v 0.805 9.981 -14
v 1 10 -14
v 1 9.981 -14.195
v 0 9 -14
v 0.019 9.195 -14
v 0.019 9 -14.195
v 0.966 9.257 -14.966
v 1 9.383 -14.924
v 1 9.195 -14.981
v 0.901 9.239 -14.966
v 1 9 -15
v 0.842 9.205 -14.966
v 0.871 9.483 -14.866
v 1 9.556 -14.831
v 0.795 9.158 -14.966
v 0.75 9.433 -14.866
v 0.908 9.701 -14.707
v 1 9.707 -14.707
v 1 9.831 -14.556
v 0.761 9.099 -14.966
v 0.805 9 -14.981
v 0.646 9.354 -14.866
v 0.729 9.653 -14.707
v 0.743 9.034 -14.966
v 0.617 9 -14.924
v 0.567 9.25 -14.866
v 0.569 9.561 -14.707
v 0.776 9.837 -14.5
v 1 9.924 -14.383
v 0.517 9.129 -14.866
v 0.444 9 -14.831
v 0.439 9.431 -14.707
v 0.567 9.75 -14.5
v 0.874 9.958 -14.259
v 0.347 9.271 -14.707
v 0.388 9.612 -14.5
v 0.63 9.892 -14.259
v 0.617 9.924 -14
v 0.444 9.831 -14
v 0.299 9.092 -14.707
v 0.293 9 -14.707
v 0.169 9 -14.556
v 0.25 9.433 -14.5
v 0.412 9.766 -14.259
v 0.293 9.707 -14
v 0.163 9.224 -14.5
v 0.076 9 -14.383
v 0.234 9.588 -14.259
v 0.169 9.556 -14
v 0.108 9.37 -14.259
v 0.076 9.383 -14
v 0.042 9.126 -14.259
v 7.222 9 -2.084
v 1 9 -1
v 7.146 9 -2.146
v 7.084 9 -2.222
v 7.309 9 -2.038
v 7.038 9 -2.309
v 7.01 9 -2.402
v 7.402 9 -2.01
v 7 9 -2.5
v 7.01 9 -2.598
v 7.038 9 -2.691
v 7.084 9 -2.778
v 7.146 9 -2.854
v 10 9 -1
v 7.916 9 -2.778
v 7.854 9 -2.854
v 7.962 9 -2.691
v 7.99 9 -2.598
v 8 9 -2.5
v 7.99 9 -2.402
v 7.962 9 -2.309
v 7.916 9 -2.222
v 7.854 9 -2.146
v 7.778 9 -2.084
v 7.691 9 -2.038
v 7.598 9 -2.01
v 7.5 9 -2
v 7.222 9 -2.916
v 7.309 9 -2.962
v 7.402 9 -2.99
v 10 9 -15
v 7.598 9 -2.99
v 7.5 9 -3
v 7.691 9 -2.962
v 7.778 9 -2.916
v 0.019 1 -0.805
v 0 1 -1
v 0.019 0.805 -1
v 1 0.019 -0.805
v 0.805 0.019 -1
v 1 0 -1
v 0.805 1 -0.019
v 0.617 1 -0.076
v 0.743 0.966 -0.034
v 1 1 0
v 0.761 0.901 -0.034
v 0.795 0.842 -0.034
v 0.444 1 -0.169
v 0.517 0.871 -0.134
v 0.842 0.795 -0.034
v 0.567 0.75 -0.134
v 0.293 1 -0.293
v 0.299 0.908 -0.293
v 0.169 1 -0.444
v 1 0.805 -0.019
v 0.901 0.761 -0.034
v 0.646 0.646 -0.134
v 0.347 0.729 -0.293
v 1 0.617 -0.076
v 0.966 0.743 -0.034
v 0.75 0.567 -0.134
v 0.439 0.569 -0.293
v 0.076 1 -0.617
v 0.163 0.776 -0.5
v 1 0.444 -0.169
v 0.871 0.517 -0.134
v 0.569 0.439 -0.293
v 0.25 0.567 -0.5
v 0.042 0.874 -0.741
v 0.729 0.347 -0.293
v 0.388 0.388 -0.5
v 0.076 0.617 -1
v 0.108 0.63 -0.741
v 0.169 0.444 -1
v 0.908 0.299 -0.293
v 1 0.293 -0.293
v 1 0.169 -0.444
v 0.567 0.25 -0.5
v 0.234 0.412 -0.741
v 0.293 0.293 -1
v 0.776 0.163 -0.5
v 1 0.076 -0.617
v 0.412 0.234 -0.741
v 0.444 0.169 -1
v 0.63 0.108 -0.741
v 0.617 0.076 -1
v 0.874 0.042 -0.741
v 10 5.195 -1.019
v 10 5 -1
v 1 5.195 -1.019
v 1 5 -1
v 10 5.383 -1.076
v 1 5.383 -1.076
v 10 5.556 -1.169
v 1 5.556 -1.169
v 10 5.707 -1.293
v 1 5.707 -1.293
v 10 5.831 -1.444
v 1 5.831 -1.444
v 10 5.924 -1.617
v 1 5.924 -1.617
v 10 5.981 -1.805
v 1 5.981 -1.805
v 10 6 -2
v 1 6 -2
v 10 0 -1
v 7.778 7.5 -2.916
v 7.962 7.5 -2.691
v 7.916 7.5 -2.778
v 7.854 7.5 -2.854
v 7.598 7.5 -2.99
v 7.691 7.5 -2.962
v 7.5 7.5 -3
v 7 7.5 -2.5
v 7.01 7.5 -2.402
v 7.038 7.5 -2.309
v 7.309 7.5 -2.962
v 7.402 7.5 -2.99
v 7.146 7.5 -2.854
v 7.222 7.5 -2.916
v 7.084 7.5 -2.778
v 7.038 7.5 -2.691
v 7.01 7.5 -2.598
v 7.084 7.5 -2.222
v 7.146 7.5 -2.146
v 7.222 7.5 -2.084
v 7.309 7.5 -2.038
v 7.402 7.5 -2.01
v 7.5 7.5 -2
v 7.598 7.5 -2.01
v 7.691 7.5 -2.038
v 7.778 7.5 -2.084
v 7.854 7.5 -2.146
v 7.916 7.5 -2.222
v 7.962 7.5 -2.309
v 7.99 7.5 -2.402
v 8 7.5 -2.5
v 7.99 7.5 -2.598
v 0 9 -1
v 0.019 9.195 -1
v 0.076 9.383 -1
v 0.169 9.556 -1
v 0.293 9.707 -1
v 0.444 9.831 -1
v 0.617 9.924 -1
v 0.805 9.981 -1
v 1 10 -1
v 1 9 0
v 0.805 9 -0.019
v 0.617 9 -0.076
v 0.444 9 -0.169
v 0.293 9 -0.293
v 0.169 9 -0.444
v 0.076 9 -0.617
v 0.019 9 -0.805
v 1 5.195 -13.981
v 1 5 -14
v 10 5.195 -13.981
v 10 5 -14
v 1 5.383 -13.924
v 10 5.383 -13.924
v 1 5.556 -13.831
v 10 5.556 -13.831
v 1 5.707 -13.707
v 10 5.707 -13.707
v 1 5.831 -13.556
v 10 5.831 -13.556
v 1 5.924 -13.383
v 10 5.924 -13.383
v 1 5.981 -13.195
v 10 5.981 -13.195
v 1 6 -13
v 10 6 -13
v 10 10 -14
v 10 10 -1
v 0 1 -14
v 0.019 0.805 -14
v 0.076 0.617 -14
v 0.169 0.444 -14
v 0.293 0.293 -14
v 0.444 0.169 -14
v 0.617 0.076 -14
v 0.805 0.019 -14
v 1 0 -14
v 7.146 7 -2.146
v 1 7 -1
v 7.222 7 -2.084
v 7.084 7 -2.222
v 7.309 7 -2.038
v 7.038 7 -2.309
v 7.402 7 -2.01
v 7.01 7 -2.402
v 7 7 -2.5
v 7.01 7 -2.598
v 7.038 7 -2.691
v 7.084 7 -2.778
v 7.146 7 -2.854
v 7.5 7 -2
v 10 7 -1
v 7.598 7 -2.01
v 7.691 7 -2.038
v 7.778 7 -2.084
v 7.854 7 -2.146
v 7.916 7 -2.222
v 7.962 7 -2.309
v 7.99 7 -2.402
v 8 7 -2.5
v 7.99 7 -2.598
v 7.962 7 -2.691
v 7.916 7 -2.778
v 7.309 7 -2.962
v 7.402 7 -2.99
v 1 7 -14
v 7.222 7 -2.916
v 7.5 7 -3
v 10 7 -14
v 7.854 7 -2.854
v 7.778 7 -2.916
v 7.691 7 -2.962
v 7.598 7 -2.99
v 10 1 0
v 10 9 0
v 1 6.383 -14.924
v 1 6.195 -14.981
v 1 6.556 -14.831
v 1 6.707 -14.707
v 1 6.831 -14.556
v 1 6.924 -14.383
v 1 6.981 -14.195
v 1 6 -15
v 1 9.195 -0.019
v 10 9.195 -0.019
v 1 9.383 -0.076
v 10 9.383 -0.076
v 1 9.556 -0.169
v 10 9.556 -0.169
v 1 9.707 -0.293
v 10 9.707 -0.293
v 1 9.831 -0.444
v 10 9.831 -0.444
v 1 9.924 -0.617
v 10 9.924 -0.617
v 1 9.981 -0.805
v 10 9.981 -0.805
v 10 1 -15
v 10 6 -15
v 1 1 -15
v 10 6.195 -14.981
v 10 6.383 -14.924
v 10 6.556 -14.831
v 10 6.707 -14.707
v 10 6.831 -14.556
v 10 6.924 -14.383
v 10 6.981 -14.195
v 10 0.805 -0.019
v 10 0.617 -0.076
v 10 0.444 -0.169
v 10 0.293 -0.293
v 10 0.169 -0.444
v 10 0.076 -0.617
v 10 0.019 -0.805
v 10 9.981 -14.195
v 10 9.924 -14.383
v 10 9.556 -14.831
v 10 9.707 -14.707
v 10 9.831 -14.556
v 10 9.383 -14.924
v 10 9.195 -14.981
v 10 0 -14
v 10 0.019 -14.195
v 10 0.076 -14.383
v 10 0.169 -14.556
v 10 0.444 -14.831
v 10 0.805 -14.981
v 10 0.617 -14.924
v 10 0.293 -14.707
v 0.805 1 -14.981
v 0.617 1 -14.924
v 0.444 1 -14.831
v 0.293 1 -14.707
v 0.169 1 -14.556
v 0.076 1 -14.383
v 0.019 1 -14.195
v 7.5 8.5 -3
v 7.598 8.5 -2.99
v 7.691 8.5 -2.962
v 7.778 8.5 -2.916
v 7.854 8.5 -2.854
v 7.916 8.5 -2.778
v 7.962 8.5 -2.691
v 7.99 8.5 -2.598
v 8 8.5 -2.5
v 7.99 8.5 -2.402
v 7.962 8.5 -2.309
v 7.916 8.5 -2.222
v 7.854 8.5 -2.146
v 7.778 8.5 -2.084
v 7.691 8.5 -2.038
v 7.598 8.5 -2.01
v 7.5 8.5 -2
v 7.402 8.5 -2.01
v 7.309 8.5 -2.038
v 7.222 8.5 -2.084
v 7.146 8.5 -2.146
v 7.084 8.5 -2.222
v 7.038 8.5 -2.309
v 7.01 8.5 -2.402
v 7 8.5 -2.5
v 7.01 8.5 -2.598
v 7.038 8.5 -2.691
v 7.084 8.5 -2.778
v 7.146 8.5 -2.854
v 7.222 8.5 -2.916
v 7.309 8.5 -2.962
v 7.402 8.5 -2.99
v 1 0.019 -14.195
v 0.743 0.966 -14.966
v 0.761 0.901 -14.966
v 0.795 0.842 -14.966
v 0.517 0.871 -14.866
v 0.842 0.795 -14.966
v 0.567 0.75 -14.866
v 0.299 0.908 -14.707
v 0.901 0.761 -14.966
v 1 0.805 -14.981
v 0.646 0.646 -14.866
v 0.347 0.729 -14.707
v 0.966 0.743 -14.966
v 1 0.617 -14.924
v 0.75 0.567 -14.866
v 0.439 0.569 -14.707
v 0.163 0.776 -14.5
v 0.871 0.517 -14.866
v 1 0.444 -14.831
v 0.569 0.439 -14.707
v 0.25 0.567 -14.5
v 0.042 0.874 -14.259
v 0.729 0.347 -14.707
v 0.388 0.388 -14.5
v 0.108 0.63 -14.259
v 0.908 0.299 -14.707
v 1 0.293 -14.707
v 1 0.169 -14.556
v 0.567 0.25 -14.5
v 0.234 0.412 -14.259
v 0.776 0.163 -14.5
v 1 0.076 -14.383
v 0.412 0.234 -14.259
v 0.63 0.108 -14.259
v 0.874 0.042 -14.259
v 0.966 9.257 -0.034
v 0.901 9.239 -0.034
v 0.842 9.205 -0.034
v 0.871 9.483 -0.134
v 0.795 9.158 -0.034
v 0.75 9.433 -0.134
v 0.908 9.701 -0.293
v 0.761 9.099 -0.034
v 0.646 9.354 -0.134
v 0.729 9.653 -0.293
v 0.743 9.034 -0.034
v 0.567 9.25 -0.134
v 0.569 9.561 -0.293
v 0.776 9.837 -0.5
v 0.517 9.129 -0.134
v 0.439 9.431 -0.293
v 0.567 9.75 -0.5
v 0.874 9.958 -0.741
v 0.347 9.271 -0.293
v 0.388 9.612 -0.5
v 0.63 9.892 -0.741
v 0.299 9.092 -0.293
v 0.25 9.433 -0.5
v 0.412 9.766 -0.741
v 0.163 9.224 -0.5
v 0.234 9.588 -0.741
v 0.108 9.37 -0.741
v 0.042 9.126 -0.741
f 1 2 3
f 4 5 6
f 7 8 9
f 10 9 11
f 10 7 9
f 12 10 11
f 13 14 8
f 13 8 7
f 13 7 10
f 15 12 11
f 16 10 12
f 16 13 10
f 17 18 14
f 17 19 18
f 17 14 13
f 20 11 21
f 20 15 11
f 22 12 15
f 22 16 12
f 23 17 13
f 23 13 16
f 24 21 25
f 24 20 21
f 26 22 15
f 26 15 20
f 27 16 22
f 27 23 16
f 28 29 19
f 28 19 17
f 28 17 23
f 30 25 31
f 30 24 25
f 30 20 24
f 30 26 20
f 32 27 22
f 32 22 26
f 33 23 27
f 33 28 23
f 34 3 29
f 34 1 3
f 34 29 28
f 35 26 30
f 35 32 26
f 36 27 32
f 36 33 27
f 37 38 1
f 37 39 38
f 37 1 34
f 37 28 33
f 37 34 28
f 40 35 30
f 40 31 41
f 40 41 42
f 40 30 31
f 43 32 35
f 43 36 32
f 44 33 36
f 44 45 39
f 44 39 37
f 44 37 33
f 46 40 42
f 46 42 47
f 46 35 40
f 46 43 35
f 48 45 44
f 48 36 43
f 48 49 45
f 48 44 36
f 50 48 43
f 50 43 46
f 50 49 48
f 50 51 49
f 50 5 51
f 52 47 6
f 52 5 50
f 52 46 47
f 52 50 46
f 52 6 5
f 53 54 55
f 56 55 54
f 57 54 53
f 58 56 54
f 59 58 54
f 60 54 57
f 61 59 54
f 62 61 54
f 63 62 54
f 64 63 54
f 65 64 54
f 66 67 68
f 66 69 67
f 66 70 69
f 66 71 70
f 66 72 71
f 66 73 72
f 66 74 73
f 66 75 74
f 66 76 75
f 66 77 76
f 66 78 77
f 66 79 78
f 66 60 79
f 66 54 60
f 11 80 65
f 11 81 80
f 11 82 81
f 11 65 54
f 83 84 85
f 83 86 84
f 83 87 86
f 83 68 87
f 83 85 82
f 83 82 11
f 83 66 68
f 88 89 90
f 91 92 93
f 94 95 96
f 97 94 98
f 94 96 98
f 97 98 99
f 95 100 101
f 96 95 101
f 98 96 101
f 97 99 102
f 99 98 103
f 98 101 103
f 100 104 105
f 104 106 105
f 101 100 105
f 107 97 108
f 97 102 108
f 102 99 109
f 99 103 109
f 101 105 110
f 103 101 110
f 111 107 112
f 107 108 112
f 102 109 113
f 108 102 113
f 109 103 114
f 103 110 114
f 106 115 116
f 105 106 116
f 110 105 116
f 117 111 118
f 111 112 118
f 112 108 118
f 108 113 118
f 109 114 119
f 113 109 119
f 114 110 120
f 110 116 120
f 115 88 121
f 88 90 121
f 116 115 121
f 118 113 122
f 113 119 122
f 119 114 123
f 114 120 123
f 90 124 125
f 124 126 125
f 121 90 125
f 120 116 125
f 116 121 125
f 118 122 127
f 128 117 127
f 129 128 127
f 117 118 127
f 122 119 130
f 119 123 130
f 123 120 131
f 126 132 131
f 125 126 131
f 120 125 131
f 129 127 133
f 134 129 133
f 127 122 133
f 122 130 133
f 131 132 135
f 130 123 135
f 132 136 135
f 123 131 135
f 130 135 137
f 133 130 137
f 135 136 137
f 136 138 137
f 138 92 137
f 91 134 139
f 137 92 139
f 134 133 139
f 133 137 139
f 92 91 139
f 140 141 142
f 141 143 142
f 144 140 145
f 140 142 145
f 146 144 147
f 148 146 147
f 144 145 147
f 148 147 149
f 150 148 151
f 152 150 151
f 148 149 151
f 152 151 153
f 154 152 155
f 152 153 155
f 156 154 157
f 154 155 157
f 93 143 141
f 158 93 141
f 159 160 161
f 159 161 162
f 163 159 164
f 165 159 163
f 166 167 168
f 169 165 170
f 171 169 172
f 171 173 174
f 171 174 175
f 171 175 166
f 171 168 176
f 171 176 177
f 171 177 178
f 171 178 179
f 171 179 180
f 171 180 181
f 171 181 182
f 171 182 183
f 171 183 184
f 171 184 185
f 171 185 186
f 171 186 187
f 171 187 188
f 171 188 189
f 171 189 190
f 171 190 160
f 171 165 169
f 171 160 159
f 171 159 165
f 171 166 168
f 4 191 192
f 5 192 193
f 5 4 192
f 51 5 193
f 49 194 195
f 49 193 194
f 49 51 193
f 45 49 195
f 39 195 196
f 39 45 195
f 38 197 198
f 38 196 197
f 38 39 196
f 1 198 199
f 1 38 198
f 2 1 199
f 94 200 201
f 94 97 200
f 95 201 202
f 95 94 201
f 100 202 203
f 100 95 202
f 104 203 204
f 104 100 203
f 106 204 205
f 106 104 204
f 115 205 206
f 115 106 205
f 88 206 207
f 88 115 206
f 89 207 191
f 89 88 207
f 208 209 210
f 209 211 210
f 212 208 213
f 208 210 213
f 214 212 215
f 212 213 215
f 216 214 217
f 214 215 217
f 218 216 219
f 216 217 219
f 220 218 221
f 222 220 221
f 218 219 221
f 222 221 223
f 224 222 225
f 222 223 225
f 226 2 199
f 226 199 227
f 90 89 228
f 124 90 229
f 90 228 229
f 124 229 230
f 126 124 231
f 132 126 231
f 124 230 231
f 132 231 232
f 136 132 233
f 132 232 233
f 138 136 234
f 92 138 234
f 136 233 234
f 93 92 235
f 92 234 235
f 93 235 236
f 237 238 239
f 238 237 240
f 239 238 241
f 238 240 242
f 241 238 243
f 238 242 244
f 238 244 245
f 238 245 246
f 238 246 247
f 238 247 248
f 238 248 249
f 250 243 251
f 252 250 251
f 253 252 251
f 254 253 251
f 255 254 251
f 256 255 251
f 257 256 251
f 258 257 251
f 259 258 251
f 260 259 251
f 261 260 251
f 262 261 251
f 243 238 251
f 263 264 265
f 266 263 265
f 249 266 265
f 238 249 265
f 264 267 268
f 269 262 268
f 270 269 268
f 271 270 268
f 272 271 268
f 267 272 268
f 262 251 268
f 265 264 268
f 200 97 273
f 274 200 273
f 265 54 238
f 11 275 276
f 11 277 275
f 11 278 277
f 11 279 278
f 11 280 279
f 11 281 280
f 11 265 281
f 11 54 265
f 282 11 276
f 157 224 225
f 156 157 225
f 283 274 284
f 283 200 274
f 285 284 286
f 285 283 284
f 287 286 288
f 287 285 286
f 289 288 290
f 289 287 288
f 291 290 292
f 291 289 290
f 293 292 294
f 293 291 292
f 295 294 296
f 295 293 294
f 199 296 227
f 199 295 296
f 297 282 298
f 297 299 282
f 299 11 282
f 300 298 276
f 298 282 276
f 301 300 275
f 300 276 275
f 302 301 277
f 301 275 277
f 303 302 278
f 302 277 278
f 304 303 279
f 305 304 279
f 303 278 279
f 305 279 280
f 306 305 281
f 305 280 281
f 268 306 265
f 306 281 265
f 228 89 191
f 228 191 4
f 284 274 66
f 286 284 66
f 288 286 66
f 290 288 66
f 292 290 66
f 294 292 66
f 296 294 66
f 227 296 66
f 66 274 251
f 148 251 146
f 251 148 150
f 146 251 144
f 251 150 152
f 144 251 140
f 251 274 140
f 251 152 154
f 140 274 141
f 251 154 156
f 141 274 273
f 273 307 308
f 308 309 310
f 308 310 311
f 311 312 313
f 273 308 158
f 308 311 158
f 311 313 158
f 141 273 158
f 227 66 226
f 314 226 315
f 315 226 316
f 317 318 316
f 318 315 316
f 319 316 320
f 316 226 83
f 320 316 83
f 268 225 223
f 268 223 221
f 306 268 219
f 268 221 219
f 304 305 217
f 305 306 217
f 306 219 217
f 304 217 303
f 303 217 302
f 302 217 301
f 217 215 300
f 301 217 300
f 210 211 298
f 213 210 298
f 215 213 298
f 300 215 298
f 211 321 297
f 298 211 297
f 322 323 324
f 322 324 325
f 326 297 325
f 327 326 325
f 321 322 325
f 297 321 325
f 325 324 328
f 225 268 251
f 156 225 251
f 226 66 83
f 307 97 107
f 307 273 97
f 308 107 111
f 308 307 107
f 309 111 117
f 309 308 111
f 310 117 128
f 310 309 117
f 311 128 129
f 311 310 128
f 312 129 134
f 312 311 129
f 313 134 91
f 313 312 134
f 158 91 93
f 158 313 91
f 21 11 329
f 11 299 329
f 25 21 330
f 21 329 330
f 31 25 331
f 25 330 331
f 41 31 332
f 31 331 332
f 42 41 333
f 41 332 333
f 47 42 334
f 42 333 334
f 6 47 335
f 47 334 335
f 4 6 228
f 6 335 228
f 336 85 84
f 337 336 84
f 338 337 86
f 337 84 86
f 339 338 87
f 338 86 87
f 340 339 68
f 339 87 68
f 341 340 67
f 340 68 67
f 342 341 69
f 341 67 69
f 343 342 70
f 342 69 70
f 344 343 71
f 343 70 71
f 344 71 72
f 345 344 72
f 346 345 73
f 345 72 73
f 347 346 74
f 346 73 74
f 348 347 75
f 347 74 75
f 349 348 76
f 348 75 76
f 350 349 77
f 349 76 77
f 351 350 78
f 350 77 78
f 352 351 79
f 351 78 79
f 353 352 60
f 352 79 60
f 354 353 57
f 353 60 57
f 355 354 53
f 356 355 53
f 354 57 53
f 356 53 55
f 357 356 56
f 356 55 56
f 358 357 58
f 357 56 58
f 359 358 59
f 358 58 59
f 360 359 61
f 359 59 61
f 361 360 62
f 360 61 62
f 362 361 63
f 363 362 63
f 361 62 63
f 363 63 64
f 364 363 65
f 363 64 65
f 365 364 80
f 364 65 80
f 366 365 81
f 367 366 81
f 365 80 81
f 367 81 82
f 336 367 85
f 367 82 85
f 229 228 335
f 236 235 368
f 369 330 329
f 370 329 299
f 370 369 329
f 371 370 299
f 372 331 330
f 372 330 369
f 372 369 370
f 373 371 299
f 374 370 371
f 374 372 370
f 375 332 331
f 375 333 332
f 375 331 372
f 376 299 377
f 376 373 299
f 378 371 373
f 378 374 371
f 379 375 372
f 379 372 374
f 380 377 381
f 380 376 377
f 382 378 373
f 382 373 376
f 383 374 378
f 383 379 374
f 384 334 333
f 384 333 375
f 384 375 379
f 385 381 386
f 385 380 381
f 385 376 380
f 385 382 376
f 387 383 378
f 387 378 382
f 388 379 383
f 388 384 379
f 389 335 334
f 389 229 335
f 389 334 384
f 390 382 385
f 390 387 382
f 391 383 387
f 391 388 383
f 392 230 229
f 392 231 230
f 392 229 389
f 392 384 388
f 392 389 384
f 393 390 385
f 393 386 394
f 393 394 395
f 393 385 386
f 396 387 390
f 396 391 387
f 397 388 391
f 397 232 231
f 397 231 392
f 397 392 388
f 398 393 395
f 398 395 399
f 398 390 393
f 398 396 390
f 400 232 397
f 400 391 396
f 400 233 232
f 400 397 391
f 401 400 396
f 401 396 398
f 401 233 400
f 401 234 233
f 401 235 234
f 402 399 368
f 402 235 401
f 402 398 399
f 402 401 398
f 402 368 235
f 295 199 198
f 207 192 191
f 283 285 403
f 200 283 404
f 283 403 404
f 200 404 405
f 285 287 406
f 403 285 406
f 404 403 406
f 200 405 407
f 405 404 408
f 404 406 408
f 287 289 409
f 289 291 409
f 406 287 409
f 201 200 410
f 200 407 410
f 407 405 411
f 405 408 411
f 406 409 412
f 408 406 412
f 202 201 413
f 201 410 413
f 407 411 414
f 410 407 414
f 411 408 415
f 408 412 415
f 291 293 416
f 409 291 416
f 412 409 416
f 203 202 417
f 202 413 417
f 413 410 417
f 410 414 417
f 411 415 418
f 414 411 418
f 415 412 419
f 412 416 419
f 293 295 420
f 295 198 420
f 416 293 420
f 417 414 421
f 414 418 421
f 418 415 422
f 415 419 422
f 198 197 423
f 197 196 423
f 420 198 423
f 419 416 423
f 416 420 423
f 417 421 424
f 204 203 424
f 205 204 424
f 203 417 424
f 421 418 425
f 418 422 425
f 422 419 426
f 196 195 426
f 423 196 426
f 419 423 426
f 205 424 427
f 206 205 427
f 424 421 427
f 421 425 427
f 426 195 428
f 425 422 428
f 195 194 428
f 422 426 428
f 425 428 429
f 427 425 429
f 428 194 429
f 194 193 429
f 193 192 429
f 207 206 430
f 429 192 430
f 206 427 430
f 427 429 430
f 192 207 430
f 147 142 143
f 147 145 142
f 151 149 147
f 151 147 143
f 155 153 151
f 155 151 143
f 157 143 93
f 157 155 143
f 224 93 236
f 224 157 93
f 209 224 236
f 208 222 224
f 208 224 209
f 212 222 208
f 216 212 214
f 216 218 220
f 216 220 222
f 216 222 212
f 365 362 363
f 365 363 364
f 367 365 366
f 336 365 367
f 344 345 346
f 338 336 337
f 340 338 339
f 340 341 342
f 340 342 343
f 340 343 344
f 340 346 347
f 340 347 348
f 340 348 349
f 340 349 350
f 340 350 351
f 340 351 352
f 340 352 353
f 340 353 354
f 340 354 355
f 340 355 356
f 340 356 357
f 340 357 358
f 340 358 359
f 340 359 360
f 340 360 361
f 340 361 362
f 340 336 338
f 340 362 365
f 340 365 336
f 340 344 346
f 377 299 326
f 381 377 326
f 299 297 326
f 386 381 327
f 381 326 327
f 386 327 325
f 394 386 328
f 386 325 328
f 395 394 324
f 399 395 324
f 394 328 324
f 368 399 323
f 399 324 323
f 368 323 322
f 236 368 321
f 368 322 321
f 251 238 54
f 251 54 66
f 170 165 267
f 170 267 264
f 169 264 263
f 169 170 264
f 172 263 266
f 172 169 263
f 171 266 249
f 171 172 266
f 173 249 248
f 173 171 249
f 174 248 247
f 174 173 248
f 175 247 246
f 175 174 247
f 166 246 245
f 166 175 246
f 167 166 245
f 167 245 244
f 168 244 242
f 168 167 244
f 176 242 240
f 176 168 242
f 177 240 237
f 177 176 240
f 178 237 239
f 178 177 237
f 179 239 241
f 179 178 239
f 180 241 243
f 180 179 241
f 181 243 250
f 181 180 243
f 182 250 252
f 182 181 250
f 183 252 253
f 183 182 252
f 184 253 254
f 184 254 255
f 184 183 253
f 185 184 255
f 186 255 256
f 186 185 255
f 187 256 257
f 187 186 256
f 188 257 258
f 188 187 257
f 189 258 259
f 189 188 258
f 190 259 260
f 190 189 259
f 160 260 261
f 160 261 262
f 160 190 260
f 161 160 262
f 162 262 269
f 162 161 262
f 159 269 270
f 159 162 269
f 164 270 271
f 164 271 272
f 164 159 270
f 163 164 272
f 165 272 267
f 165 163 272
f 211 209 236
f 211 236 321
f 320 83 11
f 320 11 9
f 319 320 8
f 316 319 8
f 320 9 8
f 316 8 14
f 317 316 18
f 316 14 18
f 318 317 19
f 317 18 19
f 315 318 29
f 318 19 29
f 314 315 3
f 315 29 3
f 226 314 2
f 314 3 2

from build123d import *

# Parameters (mm, degrees)
SKETCH1_W           = 10
SKETCH1_H           = 15
BOSS_EXTRUDE1_DEPTH = 10
SHELL1_T            = -1
BOSS_EXTRUDE4_REACH = 21.9
SKETCH5_W           = 9
SKETCH5_H           = 1
SKETCH3_R           = 0.5
BOSS_EXTRUDE3_DEPTH = 0.5
BOSS_EXTRUDE5_START = 0.5
SKETCH6_R           = 0.5
BOSS_EXTRUDE5_DEPTH = 0.5
SKETCH8_W           = 9
SKETCH8_H           = 13
CUT_EXTRUDE1_DEPTH  = 21.14944168
SKETCH10_W          = 1
SKETCH10_H          = 2
CUT_EXTRUDE4_DEPTH  = 9
FILLET1_R           = 1
FILLET2_R           = 1
FILLET3_R           = 1
FILLET5_R           = 1


with BuildPart() as part:
    # Sketch1 → Boss-Extrude1 (new body)
    with BuildSketch(Plane(origin=(0, 0, 0), x_dir=(1, 0, 0), z_dir=(0, 1, 0))):
        with Locations((5, 7.5)):
            Rectangle(SKETCH1_W, SKETCH1_H)
    extrude(amount=BOSS_EXTRUDE1_DEPTH)

    # Shell1
    shell1_openings = [part.faces().sort_by_distance(p)[0] for p in [
        (10, 5, -7.5),
    ]]
    offset(amount=SHELL1_T, openings=shell1_openings, kind=Kind.INTERSECTION)

    # Sketch5 → Boss-Extrude4 (add, up to next)
    with BuildSketch(Plane.XY.offset(-14), mode=Mode.PRIVATE) as boss_extrude4_sk1:
        with Locations((5.5, 6.5)):
            Rectangle(SKETCH5_W, SKETCH5_H)
    boss_extrude4_tool1 = extrude(boss_extrude4_sk1.sketch, amount=BOSS_EXTRUDE4_REACH, mode=Mode.PRIVATE) - part.part
    add(boss_extrude4_tool1.solids().sort_by_distance((5.5, 6.5, -14))[0])

    # Sketch3 → Boss-Extrude3 (add)
    with BuildSketch(Plane(origin=(0, 9, 0), x_dir=(-1, 0, 0), z_dir=(0, -1, 0))):
        with Locations(Location((-7.5, 2.5, 0), (0, 0, 90))):
            Circle(SKETCH3_R)
    extrude(amount=BOSS_EXTRUDE3_DEPTH)

    # Sketch6 → Boss-Extrude5 (add)
    with BuildSketch(Plane(origin=(0, 7, 0), x_dir=(1, 0, 0), z_dir=(0, 1, 0)).offset(BOSS_EXTRUDE5_START)):
        with Locations(Location((7.5, 2.5, 0), (0, 0, 90))):
            Circle(SKETCH6_R)
    extrude(amount=-BOSS_EXTRUDE5_DEPTH)

    # Sketch8 → Cut-Extrude1 (cut, through all)
    with BuildSketch(Plane(origin=(0, 1, 0), x_dir=(1, 0, 0), z_dir=(0, 1, 0))):
        with Locations((5.5, 7.5)):
            Rectangle(SKETCH8_W, SKETCH8_H)
    extrude(amount=-CUT_EXTRUDE1_DEPTH, mode=Mode.SUBTRACT)

    # Sketch10 → Cut-Extrude4 (cut)
    with BuildSketch(Plane(origin=(10, 0, 0), x_dir=(0, 0, -1), z_dir=(1, 0, 0))):
        with Locations((14.5, 8)):
            Rectangle(SKETCH10_W, SKETCH10_H)
    extrude(amount=-CUT_EXTRUDE4_DEPTH, mode=Mode.SUBTRACT)

    # Fillet1
    fillet1_edges = [part.edges().sort_by_distance(p)[0] for p in [
        (0, 10, -7.5),
        (0, 0, -7.5),
    ]]
    fillet(fillet1_edges, radius=FILLET1_R - 0.0001)  # a hair under: the kernel refuses the full size

    # Fillet2
    fillet2_edges = [part.edges().sort_by_distance(p)[0] for p in [
        (5.49995, 0, 0),
        (0.292863929, 0.292863929, 0),
        (0, 5, 0),
        (0.292863929, 9.707136071, 0),
        (5.49995, 10, 0),
    ]]
    fillet(fillet2_edges, radius=FILLET2_R - 0.0001)  # a hair under: the kernel refuses the full size

    # Fillet3
    fillet3_edges = [part.edges().sort_by_distance(p)[0] for p in [
        (5.49995, 0, -15),
        (0.292863929, 0.292863929, -15),
        (0, 5, -15),
        (0.292863929, 9.707136071, -15),
        (5.49995, 10, -15),
    ]]
    fillet(fillet3_edges, radius=FILLET3_R - 0.0001)  # a hair under: the kernel refuses the full size

    # Fillet5
    fillet5_edges = [part.edges().sort_by_distance(p)[0] for p in [
        (5.5, 6, -1),
        (5.5, 6, -14),
        (5.5, 7, -15),
    ]]
    fillet(fillet5_edges, radius=FILLET5_R)


solid = part.part
